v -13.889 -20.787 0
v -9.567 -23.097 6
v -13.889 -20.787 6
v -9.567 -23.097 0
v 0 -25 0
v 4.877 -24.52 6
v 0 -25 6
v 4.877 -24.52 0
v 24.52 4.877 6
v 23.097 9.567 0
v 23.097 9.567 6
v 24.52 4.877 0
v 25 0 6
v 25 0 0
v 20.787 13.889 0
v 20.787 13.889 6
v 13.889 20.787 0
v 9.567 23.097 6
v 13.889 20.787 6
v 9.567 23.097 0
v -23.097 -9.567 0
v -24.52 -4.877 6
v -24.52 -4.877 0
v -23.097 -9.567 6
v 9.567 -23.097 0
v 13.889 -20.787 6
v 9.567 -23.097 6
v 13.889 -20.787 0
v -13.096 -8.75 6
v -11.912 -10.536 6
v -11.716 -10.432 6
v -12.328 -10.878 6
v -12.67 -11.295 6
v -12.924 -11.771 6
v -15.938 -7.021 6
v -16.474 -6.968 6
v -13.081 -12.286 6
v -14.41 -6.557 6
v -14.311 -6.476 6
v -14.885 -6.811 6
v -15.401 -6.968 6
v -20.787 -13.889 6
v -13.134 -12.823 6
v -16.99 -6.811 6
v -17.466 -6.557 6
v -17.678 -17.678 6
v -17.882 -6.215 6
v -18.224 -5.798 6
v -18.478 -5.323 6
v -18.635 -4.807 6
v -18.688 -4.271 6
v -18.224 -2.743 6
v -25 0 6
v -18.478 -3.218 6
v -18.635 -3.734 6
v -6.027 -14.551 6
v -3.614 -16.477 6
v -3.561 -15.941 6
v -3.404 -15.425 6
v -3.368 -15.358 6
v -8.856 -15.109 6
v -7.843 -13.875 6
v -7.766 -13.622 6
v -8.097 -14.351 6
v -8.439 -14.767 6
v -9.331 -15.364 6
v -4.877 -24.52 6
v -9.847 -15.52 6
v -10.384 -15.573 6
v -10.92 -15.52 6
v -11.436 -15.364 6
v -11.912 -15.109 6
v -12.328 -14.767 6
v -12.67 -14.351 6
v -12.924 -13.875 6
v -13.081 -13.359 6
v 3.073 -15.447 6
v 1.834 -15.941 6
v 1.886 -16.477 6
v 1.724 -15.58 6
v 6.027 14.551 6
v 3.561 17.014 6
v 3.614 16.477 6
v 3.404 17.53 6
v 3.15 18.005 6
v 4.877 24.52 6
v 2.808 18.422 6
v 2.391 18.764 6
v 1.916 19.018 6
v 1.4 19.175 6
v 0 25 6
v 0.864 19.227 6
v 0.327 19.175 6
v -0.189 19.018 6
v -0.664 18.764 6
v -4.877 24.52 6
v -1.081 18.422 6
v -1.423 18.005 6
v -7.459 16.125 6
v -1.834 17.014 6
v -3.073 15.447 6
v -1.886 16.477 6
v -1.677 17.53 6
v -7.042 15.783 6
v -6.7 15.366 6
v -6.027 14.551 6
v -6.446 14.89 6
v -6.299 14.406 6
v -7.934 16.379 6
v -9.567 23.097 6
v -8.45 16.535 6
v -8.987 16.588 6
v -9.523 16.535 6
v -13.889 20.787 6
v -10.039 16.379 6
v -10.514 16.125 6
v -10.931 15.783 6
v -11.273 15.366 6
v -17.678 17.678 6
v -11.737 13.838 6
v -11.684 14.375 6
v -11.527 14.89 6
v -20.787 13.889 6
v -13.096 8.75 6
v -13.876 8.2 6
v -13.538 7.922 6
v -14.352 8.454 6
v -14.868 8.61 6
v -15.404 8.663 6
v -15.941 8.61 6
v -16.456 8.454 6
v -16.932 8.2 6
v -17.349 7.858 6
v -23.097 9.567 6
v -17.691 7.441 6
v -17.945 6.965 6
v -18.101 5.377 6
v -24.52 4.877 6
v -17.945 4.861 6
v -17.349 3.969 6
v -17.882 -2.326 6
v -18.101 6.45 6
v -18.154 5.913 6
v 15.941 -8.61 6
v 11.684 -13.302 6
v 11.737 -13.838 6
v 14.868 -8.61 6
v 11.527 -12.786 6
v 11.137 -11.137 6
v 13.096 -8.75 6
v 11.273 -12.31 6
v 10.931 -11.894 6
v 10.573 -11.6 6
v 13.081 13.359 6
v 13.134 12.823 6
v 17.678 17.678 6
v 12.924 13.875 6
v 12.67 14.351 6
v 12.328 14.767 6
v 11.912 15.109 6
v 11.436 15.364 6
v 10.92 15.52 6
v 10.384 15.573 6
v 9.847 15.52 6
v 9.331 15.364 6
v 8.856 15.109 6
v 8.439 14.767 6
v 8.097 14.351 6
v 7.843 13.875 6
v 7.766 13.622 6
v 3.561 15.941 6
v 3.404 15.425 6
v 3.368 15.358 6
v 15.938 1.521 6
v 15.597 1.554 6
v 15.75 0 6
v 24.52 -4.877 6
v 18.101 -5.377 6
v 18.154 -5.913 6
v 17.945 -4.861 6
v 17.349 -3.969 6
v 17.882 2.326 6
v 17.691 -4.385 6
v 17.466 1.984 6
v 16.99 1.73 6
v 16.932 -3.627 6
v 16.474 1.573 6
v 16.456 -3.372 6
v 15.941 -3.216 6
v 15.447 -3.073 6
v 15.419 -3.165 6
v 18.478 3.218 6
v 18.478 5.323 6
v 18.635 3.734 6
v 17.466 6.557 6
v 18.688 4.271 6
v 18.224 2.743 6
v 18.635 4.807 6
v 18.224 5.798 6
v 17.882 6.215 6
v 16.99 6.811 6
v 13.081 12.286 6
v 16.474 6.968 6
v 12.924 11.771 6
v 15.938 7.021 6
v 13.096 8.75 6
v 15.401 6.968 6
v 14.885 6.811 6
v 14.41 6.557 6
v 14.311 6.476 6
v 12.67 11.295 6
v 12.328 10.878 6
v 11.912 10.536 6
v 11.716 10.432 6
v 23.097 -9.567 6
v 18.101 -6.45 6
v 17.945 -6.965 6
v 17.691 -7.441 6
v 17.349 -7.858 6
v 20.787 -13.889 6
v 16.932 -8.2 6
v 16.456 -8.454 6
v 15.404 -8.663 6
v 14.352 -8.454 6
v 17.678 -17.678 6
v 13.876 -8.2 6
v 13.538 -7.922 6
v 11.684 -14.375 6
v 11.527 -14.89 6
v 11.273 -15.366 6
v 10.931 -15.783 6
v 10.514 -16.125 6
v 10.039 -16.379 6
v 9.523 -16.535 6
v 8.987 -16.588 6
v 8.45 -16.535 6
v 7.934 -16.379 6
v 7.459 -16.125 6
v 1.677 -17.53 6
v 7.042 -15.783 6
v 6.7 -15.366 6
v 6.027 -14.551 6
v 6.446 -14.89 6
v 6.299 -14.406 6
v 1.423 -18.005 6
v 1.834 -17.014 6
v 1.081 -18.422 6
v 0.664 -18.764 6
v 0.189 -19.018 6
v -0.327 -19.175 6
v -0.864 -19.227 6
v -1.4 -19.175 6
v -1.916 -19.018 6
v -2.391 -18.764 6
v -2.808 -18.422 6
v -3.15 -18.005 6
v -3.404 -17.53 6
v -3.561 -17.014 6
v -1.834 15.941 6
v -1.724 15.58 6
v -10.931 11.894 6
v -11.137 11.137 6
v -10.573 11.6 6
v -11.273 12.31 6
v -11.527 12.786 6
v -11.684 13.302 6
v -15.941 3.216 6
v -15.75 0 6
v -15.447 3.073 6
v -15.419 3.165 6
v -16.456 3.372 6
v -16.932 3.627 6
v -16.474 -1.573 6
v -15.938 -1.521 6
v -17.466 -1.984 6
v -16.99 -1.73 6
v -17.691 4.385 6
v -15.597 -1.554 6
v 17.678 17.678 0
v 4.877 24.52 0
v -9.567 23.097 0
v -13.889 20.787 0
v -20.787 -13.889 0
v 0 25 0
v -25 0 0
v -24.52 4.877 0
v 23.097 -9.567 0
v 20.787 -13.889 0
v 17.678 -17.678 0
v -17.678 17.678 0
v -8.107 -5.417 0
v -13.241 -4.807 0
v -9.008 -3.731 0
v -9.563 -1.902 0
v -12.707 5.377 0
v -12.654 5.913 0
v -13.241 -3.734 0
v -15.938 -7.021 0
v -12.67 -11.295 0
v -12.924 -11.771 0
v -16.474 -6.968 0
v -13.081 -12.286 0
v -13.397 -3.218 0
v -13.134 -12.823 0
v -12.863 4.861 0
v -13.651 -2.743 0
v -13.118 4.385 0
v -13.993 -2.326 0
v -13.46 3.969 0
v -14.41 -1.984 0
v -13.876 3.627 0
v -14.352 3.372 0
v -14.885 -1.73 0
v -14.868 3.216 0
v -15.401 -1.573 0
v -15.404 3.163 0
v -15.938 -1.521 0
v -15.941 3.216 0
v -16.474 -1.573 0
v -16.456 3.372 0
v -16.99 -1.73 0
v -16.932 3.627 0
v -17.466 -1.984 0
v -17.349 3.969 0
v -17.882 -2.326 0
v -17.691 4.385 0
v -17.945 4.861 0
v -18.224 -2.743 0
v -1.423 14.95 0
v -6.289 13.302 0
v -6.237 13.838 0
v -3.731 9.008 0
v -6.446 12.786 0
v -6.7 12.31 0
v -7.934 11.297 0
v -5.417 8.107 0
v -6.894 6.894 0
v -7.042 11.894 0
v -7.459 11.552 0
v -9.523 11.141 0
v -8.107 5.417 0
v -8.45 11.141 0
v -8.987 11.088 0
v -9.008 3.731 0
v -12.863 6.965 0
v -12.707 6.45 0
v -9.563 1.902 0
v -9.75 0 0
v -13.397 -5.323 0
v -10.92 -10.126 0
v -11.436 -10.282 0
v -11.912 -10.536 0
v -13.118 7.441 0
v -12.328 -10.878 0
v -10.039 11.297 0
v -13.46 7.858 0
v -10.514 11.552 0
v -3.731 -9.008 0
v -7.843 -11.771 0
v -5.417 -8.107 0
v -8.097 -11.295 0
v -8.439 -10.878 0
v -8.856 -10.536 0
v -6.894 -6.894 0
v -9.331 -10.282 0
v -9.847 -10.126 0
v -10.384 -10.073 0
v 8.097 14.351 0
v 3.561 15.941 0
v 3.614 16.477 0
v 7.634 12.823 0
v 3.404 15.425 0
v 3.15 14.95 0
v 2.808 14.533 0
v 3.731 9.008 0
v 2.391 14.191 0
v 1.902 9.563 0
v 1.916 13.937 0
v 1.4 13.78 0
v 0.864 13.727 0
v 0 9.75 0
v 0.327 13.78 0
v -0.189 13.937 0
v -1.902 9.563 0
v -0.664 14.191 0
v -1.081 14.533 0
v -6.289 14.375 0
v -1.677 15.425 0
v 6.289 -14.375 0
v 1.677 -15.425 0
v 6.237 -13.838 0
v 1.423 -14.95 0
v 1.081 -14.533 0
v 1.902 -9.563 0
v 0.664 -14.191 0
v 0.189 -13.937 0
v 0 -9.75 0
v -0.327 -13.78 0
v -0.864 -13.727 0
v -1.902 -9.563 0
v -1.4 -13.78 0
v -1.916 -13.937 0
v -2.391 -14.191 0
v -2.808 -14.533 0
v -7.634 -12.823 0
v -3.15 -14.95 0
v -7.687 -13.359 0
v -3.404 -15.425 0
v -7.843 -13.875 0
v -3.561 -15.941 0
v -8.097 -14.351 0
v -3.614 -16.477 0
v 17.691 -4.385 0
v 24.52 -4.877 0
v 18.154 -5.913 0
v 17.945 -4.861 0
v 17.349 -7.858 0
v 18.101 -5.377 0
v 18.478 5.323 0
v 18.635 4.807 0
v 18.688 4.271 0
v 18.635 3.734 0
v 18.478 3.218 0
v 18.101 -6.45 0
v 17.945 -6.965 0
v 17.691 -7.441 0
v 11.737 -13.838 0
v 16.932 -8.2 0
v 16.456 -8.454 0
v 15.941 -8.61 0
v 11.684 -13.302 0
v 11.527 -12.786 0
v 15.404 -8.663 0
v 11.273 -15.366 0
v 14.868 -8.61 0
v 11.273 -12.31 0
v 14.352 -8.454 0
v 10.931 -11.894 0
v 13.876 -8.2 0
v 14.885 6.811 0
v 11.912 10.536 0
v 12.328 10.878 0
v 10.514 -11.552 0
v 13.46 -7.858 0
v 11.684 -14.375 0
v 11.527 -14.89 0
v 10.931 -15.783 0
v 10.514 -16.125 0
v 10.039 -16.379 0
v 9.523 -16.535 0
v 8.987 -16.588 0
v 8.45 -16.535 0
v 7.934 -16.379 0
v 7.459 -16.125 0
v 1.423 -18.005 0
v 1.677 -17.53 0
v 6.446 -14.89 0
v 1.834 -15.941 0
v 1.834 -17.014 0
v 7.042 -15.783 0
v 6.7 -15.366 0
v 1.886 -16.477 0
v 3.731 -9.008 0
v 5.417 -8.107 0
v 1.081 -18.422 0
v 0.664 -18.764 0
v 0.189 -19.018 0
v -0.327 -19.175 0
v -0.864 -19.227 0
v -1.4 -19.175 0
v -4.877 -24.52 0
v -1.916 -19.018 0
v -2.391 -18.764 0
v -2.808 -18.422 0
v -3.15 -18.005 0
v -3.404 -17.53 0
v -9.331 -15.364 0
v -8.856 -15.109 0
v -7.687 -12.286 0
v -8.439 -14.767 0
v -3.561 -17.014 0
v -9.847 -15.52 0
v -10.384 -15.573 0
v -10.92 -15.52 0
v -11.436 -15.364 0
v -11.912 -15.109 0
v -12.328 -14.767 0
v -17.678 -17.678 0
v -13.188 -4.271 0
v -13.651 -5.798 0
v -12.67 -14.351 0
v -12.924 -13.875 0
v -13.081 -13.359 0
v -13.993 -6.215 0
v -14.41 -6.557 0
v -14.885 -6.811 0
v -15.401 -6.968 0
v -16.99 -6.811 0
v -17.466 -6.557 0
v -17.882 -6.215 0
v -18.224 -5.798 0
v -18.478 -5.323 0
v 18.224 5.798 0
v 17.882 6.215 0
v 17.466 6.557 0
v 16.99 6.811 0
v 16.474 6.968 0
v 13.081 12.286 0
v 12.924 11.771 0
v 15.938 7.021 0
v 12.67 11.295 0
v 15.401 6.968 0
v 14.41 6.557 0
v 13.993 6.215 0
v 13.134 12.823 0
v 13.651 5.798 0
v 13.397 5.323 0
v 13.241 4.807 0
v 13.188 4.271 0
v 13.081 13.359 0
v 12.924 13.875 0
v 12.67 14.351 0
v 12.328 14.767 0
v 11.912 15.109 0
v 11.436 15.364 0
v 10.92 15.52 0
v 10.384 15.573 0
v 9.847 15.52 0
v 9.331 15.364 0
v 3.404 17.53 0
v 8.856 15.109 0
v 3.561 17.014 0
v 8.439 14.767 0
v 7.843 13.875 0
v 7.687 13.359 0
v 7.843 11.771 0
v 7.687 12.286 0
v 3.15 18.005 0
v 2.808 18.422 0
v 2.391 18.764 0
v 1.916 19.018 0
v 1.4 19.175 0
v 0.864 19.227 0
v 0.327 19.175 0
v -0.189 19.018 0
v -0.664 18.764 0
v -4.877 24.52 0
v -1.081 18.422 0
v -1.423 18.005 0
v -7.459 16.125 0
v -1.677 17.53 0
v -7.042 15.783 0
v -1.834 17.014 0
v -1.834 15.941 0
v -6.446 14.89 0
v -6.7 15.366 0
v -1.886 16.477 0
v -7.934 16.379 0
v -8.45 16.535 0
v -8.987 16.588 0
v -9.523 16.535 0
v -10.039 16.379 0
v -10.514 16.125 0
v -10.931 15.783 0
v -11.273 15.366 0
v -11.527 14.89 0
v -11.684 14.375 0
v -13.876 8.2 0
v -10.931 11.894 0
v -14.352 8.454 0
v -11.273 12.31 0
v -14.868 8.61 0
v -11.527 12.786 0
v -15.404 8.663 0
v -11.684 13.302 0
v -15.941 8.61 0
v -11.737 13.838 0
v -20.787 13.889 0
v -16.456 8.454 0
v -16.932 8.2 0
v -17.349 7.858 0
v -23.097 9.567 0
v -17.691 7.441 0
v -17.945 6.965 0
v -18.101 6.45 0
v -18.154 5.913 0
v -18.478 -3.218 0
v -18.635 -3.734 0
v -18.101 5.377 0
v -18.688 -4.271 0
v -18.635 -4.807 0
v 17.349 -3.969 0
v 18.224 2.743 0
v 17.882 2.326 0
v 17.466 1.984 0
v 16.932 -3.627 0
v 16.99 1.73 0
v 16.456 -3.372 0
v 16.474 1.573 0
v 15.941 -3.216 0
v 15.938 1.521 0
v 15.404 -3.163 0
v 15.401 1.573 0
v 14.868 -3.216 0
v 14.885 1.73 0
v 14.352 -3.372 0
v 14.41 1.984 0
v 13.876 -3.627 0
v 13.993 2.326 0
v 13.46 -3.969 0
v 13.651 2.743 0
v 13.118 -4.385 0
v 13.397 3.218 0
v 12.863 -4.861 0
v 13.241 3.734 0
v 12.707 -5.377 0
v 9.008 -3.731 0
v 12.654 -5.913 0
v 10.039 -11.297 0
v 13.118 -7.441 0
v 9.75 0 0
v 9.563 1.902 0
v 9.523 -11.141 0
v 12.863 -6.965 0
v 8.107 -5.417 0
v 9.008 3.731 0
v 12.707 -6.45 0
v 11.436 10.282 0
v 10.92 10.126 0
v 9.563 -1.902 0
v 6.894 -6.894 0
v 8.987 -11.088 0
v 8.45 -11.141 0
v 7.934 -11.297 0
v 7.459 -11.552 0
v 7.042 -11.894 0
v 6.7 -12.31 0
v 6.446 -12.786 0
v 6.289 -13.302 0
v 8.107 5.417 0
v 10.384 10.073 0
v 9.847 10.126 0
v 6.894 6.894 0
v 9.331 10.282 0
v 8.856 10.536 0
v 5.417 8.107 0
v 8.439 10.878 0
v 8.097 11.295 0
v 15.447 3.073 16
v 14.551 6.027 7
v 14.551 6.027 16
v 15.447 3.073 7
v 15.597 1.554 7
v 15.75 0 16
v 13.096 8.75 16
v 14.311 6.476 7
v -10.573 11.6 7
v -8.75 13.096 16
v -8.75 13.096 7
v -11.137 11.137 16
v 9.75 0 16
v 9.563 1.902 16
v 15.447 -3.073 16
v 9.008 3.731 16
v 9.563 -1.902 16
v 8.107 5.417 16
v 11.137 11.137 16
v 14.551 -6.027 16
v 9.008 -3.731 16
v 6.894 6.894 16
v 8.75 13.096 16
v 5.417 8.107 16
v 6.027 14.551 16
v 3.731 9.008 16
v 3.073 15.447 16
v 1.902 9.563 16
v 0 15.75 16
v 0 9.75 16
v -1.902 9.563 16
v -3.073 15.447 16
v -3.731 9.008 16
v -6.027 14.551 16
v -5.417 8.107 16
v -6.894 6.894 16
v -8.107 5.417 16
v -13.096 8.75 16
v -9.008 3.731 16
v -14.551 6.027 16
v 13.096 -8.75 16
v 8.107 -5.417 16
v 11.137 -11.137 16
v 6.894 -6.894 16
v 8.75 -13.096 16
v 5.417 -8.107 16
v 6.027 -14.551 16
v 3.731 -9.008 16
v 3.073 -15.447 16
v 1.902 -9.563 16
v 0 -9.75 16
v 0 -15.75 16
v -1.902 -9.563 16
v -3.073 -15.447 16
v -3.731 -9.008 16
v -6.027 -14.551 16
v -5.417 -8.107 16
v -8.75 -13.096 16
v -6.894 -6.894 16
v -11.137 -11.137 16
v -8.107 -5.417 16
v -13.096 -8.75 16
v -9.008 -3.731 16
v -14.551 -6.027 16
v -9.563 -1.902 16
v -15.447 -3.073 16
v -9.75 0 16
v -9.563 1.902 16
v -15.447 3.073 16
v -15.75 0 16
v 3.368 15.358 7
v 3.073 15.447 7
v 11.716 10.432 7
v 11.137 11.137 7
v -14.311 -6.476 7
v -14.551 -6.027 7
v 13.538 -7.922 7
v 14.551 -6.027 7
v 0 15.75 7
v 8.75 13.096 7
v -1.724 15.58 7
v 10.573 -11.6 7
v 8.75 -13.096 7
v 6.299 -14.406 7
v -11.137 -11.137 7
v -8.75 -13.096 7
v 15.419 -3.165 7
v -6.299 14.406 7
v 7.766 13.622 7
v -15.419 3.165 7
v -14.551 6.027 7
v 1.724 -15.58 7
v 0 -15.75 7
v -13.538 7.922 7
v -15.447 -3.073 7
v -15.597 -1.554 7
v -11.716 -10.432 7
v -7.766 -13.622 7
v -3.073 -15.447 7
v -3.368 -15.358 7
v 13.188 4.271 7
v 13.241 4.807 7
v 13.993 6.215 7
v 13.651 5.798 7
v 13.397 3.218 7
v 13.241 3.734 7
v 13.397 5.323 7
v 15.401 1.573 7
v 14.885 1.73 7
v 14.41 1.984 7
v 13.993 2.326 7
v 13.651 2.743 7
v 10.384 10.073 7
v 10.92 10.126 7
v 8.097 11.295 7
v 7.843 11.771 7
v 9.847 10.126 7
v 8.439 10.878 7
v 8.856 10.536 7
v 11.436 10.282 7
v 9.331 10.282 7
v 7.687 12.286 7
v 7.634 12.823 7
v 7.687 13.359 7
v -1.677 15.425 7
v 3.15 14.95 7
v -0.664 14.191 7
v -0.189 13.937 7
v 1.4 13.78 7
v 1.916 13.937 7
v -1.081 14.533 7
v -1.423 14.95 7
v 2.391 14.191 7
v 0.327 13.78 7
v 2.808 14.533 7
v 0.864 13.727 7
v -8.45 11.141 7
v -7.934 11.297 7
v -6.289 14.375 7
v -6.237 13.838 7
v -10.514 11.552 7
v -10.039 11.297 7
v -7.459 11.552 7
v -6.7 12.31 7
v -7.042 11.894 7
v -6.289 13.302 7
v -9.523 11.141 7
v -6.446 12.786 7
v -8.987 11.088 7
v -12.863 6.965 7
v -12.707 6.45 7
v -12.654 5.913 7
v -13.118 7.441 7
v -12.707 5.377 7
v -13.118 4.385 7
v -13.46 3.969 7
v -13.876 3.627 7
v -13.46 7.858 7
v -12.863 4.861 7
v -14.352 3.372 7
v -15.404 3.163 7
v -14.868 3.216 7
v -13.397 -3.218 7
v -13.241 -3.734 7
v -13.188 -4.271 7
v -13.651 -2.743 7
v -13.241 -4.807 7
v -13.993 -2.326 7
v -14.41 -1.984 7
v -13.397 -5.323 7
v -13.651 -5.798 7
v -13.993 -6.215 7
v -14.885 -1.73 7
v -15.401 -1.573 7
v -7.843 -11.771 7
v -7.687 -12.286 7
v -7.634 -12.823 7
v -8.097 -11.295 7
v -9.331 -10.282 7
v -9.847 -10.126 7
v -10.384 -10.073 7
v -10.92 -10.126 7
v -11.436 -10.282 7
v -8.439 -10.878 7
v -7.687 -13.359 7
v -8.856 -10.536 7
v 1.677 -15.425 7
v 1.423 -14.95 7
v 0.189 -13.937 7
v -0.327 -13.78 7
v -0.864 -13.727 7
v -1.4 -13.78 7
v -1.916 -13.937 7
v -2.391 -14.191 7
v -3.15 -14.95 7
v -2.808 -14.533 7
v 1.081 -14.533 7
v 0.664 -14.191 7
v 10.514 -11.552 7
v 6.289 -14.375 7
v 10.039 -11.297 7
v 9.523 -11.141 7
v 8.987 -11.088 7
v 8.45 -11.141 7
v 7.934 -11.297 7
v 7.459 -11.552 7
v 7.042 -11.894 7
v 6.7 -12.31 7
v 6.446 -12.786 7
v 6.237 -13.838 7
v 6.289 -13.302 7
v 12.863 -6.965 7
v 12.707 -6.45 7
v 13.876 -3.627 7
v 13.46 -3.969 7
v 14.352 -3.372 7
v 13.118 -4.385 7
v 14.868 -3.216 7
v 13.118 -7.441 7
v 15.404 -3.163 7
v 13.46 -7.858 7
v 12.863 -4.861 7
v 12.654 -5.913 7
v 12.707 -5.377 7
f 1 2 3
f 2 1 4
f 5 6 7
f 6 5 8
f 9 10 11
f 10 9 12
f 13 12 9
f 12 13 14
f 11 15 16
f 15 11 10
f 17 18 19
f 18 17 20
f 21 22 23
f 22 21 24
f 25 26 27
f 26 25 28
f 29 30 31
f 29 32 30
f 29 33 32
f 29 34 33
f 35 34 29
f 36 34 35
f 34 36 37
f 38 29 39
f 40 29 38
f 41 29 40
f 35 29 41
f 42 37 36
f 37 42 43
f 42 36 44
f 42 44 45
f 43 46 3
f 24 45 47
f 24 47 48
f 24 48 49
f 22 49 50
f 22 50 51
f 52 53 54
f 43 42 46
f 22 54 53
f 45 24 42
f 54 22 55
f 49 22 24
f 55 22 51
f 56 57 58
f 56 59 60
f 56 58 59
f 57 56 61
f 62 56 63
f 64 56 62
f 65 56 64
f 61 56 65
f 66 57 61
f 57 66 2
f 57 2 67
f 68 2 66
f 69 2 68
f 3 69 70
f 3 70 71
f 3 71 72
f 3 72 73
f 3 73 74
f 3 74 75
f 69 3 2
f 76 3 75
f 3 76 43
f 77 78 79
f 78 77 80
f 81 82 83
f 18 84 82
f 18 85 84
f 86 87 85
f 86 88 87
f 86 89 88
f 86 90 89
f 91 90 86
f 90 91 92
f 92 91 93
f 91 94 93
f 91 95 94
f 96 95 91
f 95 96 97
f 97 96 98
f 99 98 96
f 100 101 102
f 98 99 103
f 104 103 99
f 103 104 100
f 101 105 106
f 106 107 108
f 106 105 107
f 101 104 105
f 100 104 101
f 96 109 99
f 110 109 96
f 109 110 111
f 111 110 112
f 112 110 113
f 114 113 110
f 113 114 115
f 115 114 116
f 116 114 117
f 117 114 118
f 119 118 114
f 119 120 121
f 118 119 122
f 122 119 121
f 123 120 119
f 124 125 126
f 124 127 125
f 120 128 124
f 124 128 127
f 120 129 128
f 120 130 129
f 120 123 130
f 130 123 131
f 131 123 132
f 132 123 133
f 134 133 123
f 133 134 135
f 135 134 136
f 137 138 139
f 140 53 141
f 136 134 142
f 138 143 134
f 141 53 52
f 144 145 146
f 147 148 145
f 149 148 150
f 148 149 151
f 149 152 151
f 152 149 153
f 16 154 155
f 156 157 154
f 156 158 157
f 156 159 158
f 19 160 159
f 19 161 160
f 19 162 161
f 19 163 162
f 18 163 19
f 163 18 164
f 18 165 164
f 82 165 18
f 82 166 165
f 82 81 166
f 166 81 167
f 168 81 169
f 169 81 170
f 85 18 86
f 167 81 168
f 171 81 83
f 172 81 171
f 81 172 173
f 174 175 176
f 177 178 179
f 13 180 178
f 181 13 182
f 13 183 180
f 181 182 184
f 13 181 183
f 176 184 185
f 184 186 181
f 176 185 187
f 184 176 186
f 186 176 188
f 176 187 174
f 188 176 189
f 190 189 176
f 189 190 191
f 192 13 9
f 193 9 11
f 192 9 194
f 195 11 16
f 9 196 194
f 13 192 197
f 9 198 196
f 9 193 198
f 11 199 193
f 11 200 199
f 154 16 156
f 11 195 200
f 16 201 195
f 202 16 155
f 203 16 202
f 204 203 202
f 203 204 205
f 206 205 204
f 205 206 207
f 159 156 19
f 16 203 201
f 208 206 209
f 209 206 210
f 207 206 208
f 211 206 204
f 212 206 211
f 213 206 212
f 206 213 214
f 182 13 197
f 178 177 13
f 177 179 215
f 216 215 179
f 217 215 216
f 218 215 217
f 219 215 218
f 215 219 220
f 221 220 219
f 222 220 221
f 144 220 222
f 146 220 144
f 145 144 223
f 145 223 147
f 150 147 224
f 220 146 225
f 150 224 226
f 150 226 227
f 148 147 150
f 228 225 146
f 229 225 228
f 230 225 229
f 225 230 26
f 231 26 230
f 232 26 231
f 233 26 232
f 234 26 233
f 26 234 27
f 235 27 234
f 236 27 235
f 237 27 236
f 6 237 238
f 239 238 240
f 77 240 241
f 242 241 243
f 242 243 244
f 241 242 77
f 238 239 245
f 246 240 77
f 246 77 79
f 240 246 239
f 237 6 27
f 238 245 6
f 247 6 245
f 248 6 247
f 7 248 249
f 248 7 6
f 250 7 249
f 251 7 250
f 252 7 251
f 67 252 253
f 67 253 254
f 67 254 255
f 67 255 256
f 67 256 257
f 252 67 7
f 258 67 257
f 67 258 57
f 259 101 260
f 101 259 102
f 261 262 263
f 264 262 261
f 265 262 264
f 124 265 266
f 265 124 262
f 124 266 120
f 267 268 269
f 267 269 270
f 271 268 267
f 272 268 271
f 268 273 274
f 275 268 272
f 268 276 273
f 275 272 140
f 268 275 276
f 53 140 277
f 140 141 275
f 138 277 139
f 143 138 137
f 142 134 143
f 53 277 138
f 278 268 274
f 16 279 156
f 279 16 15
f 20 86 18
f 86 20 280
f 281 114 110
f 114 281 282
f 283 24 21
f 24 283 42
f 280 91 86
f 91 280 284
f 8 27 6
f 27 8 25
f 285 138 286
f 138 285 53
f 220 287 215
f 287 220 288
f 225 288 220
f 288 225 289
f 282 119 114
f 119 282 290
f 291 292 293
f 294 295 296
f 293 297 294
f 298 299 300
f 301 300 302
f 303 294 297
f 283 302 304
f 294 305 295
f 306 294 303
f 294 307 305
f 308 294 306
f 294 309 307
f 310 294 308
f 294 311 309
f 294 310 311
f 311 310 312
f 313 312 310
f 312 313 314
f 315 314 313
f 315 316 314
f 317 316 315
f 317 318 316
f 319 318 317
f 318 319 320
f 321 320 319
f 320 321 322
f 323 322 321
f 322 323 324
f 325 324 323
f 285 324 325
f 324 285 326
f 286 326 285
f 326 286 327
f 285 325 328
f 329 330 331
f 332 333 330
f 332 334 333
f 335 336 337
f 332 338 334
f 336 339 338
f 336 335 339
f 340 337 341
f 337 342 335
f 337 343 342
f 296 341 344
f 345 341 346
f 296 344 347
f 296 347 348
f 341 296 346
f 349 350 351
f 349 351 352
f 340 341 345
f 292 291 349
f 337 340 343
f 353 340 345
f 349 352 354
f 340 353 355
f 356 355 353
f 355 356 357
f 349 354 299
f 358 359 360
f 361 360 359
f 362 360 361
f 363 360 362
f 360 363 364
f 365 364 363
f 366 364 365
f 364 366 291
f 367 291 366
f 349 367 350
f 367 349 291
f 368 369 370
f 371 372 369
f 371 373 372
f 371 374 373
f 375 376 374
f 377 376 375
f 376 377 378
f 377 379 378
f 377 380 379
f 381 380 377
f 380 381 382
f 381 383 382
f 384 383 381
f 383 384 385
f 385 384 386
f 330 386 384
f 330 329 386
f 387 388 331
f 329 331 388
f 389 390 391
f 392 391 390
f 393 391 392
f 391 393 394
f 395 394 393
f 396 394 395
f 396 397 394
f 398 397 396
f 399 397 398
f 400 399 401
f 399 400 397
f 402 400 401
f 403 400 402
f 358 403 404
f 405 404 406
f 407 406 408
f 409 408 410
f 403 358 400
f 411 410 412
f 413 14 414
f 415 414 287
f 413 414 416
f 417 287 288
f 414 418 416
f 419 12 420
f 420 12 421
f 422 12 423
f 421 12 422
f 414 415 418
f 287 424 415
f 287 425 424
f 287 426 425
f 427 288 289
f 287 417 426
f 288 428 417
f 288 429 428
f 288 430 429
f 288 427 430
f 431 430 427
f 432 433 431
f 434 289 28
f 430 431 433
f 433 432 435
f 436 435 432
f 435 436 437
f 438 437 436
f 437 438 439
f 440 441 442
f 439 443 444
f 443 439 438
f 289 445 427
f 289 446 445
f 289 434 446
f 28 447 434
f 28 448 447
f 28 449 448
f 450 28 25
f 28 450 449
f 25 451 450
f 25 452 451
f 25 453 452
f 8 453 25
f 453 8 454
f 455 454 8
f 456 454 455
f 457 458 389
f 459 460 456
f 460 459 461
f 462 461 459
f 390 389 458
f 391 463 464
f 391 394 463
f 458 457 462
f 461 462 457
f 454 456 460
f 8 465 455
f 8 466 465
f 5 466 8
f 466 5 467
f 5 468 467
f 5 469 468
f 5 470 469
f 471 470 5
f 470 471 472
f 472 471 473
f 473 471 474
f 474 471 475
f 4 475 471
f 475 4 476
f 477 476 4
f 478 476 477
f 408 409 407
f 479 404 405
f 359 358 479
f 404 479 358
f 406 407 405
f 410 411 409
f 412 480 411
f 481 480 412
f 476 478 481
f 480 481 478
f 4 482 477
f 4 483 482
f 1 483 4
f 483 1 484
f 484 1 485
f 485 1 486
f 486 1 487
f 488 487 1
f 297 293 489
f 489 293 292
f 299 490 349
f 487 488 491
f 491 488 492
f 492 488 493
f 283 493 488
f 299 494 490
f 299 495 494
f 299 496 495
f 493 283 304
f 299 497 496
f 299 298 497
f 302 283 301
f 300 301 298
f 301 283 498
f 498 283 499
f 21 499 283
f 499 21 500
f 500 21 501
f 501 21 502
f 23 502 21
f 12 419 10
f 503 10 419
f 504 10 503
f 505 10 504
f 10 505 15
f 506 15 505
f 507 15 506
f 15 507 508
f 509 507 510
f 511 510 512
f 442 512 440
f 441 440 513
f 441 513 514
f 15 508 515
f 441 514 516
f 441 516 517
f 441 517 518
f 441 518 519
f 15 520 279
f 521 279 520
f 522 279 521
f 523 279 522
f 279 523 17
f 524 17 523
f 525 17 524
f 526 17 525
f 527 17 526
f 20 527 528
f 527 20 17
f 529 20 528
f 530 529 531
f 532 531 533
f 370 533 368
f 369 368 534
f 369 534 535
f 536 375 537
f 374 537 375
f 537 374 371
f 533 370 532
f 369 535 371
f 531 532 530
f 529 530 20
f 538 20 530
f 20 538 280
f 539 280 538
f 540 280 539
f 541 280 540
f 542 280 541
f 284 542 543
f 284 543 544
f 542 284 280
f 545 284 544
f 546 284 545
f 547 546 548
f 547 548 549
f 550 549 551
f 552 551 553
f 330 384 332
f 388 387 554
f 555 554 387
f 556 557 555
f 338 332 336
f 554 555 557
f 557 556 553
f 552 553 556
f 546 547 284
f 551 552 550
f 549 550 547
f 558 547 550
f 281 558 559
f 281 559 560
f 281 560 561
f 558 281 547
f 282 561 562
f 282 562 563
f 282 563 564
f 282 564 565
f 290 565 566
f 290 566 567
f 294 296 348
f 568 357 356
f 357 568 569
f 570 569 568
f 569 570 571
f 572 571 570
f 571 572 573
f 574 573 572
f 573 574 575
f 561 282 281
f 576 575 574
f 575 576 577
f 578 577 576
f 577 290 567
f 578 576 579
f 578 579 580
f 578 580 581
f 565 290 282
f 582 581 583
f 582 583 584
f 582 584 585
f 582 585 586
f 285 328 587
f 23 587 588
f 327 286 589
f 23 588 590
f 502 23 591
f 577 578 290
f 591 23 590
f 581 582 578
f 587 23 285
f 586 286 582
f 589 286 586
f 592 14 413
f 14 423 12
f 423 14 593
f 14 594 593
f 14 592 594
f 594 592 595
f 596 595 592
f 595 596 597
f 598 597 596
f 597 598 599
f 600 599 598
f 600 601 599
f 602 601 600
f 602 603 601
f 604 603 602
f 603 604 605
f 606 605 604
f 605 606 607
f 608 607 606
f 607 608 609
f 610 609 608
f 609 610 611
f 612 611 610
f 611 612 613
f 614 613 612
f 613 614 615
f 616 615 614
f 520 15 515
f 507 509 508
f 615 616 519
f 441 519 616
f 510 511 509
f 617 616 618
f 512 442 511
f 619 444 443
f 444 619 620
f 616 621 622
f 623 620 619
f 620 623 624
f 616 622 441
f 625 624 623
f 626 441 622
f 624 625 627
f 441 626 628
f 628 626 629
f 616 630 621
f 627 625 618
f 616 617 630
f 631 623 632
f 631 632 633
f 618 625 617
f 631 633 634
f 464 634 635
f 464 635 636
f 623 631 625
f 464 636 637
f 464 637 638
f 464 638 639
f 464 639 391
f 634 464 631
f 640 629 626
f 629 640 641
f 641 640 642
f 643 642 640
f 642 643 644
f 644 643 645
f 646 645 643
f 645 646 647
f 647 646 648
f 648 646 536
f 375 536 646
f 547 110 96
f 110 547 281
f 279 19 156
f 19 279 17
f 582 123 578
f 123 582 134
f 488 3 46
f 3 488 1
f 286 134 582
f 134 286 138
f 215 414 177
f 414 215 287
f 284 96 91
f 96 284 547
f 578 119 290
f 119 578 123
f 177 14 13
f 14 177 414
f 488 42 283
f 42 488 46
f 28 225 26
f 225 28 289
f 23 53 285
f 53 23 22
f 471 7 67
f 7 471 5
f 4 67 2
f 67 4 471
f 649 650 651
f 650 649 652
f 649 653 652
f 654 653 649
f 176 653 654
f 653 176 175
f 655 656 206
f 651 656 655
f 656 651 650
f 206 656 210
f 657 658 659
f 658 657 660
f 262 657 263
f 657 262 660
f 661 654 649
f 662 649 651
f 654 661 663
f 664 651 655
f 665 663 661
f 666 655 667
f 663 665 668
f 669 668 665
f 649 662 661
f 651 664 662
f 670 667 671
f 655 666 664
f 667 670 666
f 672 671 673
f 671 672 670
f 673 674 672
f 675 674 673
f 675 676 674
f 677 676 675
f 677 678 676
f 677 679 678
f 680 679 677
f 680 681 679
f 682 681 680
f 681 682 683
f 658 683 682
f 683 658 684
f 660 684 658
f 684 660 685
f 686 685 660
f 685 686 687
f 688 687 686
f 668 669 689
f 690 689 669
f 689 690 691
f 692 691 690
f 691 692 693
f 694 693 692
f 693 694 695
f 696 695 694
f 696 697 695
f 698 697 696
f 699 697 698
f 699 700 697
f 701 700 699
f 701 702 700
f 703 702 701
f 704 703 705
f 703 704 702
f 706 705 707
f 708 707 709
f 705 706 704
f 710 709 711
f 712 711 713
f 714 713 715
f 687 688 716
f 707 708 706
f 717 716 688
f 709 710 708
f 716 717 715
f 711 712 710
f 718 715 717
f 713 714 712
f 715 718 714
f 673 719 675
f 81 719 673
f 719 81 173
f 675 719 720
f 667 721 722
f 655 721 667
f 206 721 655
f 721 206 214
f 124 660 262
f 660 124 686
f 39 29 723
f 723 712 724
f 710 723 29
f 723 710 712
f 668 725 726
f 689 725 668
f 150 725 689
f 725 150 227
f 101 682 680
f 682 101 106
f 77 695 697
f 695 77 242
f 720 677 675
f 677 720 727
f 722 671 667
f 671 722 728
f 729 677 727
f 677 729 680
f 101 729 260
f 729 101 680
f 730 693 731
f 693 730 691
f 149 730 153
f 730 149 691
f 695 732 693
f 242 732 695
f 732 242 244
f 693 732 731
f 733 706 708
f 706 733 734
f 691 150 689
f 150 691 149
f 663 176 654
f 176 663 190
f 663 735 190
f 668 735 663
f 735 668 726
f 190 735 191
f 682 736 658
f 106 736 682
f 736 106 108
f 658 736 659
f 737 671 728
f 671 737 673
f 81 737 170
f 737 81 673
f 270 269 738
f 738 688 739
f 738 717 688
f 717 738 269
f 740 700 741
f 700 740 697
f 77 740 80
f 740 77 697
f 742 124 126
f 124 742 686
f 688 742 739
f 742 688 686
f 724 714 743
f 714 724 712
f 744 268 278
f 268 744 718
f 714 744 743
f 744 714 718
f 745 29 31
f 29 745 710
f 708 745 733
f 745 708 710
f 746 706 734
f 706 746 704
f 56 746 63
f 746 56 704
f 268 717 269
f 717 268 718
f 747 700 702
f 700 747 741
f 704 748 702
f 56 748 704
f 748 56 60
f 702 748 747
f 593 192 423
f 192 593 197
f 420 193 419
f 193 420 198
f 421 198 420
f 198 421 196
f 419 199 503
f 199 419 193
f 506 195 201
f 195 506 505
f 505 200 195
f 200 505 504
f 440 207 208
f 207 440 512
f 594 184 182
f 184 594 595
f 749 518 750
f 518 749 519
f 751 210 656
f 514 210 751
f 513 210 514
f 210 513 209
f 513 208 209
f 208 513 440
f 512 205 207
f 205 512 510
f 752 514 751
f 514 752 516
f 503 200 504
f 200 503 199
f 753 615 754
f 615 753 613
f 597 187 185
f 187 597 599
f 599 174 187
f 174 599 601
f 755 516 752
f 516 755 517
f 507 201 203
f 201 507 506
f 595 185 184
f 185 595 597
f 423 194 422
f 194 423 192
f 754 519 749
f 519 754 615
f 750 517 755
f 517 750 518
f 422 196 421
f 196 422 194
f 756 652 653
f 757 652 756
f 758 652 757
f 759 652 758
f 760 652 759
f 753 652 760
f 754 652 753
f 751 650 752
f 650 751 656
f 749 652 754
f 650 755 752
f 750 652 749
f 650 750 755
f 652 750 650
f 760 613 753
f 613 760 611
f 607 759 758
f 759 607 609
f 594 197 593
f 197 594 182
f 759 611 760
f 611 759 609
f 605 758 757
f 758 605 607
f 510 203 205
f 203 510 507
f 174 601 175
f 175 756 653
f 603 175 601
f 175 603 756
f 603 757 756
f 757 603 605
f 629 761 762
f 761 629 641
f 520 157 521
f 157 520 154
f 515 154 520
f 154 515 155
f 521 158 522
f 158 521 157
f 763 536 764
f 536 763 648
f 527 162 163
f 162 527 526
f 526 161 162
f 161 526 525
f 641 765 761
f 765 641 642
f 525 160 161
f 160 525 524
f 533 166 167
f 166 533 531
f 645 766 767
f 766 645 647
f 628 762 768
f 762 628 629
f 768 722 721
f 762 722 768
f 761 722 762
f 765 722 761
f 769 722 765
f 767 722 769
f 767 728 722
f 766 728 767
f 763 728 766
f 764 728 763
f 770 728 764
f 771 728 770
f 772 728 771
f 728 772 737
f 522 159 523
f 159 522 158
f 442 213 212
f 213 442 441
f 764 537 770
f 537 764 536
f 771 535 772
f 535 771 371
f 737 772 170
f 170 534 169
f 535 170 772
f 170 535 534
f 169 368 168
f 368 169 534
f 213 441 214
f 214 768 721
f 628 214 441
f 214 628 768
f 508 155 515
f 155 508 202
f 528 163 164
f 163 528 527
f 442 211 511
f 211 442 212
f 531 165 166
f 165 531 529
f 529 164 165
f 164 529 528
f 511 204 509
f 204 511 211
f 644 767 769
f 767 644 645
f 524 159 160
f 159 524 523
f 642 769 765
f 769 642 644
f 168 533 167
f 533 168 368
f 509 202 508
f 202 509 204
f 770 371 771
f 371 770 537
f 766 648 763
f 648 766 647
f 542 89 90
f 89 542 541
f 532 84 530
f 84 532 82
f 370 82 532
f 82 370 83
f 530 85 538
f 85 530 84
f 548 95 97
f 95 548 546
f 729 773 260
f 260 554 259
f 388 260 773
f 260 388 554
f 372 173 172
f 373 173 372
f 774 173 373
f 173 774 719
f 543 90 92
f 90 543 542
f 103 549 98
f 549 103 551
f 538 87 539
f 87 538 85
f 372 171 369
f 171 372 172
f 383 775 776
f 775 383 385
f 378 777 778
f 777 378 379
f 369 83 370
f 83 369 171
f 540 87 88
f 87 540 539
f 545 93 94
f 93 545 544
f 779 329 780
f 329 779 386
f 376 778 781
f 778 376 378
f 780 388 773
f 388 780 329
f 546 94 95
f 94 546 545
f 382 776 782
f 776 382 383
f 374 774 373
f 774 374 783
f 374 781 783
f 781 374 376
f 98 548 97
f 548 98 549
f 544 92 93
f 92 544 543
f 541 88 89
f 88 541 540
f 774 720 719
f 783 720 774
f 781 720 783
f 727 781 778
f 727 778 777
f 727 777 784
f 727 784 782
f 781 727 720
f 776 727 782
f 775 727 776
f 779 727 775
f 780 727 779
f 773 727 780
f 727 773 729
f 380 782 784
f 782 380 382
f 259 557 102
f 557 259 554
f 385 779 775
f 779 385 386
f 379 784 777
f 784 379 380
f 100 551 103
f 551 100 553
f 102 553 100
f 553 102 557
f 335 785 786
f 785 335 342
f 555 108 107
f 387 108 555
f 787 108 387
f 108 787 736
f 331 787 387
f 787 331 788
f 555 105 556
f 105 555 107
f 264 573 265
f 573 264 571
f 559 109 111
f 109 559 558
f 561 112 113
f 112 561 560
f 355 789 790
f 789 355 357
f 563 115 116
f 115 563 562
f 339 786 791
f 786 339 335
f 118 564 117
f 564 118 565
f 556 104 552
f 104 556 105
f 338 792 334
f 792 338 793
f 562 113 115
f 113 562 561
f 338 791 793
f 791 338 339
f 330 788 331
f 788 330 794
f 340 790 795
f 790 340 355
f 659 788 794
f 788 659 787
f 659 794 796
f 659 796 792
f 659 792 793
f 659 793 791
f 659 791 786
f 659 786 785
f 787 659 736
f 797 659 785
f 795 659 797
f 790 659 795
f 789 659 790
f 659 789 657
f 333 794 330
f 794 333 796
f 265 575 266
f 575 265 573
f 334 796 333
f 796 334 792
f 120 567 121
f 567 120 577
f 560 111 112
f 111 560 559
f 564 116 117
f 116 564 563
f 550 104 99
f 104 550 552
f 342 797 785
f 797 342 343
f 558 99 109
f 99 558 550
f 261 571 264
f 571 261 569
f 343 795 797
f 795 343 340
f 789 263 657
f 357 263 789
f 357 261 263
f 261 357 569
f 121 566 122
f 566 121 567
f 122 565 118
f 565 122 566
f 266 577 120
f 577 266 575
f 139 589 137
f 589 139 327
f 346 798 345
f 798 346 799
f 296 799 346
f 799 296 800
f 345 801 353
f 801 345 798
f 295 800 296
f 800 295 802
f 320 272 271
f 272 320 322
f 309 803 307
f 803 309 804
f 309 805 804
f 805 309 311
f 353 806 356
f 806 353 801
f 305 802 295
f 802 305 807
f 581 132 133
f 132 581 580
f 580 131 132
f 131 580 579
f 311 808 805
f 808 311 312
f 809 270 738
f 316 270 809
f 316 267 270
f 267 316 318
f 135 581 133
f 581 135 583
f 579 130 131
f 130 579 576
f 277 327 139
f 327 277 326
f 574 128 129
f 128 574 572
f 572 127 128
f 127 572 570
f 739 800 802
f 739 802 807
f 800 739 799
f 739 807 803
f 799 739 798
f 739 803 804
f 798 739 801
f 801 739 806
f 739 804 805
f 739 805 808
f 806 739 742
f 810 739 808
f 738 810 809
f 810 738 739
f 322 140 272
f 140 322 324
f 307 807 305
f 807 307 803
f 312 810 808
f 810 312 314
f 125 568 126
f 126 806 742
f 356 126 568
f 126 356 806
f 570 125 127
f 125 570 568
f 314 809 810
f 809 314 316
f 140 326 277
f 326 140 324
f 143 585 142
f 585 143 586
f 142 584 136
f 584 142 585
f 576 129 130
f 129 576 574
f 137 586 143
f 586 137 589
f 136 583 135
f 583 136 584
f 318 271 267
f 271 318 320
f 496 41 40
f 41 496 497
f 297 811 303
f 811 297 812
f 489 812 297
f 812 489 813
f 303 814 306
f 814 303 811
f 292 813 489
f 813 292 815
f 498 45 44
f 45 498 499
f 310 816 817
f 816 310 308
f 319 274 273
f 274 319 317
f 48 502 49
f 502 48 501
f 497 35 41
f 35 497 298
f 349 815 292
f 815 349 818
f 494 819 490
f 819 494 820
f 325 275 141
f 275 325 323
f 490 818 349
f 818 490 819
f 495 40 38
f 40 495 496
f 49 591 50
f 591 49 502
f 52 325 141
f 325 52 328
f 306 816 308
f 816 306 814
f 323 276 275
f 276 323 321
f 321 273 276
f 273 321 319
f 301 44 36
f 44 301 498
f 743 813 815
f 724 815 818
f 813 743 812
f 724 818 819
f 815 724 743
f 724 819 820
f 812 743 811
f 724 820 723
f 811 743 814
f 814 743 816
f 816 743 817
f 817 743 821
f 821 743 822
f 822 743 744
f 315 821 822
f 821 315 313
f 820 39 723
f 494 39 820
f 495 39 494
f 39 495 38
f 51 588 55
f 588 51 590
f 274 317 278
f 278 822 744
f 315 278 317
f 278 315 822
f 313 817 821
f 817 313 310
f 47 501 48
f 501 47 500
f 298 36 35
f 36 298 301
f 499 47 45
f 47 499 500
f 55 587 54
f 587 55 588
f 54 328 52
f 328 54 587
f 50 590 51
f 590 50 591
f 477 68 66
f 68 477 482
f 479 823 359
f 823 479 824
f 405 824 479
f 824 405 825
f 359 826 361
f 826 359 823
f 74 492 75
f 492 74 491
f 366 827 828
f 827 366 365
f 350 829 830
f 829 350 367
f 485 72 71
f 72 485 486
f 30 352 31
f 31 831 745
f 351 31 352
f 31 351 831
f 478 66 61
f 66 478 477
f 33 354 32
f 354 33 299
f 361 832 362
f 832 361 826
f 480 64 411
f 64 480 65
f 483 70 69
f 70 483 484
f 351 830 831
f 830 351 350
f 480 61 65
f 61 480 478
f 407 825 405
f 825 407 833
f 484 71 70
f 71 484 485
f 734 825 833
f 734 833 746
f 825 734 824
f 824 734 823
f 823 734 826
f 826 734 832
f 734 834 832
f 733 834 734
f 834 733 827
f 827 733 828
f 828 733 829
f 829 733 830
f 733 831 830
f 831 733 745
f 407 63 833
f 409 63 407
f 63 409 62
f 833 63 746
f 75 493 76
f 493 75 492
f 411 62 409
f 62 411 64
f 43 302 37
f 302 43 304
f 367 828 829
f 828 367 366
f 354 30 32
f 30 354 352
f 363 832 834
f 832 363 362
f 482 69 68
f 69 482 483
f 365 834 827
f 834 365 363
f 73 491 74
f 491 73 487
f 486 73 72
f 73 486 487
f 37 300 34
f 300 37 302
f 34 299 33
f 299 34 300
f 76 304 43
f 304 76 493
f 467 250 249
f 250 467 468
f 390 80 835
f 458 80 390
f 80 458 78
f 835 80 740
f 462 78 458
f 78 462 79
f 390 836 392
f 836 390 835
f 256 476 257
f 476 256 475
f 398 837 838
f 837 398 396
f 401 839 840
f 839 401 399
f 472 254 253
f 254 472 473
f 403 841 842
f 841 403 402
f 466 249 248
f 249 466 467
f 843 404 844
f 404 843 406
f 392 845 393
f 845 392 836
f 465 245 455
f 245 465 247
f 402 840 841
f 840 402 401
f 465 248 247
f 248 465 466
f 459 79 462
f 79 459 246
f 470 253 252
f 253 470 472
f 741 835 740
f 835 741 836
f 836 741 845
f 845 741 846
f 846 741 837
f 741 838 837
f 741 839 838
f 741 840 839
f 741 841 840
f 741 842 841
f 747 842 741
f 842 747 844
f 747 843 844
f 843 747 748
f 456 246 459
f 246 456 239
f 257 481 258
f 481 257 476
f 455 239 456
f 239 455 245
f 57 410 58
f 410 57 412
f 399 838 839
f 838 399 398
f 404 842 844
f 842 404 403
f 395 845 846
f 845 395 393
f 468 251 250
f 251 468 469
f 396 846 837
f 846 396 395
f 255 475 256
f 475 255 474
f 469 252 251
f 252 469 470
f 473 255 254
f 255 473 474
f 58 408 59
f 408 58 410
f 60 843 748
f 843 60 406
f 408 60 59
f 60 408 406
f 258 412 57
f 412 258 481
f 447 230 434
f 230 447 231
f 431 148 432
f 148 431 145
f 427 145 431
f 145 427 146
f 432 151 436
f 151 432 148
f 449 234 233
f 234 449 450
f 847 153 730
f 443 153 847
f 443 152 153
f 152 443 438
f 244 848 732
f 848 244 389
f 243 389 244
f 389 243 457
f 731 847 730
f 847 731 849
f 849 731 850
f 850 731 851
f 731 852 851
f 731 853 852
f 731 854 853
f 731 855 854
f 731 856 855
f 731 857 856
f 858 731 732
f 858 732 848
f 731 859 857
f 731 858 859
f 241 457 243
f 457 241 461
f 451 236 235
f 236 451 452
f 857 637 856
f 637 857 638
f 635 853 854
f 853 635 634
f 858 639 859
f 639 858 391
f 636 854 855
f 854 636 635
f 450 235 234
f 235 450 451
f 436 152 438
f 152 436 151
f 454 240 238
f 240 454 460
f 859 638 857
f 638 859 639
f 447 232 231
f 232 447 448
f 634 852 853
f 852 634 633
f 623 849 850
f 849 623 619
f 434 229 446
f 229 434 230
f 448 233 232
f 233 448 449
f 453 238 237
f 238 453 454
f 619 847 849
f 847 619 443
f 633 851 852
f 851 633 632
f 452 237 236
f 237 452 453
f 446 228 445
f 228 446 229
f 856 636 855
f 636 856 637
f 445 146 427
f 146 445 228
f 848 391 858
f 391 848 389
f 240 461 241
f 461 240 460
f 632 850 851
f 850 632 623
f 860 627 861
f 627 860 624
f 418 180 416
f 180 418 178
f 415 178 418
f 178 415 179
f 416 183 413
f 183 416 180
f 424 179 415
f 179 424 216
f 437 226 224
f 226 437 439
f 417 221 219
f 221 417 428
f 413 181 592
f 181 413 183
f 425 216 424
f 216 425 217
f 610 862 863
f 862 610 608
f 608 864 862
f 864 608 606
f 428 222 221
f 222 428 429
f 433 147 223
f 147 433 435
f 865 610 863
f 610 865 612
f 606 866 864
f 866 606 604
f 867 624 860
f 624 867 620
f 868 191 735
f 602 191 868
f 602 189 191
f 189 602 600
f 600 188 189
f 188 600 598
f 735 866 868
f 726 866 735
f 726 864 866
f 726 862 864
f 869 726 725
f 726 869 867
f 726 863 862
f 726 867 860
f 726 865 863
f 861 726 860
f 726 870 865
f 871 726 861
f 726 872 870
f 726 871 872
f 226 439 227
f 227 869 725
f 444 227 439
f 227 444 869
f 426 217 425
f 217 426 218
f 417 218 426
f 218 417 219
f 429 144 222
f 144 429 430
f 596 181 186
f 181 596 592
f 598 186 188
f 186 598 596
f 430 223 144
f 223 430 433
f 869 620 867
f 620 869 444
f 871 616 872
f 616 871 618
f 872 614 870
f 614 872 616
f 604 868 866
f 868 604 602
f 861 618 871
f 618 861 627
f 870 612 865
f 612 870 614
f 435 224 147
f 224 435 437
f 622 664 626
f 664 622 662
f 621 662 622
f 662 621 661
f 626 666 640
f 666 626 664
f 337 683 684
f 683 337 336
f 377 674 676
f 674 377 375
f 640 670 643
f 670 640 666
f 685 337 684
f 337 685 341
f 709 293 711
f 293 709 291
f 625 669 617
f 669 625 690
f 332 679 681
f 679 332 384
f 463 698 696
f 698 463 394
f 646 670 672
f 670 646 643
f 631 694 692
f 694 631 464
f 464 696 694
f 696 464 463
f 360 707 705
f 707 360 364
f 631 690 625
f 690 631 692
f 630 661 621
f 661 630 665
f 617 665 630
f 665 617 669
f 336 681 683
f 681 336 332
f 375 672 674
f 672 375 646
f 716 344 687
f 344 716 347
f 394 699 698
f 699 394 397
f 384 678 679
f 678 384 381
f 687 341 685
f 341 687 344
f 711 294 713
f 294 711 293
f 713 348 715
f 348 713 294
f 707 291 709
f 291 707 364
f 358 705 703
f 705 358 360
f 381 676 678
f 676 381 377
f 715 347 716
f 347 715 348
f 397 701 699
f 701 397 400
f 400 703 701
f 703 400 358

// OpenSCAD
$fn = 32;

// ----------------------------------------------------------------------
// Flange Ø50 x 6
// 10 holes on a Ø33 bolt circle, bolted joints
// ----------------------------------------------------------------------

// --- parameters (mm) ---
flange_d = 50;   // outside diameter of the flange
thickness = 6;   // flange thickness
holes = 10;      // number of bolt holes
pcd = 33;        // bolt circle diameter
start_deg = 15;  // angle of the first hole, from +X
hole_d = 5.5;    // bolt hole diameter
bore_d = 19.5;   // central through bore
hub_d = 31.5;    // hub outside diameter
hub_h = 10;      // hub height above the flange face (0 = no hub)

// --- derived feature positions (mm) ---
height = thickness + hub_h;  // = 16   overall height of the part
pcd_r = pcd / 2;             // = 16.5   bolt circle radius
hole_step = 360 / holes;     // = 36   angular pitch
feature_centers = [
  [pcd_r * cos(start_deg + 0 * hole_step), pcd_r * sin(start_deg + 0 * hole_step)],
  [pcd_r * cos(start_deg + 1 * hole_step), pcd_r * sin(start_deg + 1 * hole_step)],
  [pcd_r * cos(start_deg + 2 * hole_step), pcd_r * sin(start_deg + 2 * hole_step)],
  [pcd_r * cos(start_deg + 3 * hole_step), pcd_r * sin(start_deg + 3 * hole_step)],
  [pcd_r * cos(start_deg + 4 * hole_step), pcd_r * sin(start_deg + 4 * hole_step)],
  [pcd_r * cos(start_deg + 5 * hole_step), pcd_r * sin(start_deg + 5 * hole_step)],
  [pcd_r * cos(start_deg + 6 * hole_step), pcd_r * sin(start_deg + 6 * hole_step)],
  [pcd_r * cos(start_deg + 7 * hole_step), pcd_r * sin(start_deg + 7 * hole_step)],
  [pcd_r * cos(start_deg + 8 * hole_step), pcd_r * sin(start_deg + 8 * hole_step)],
  [pcd_r * cos(start_deg + 9 * hole_step), pcd_r * sin(start_deg + 9 * hole_step)]
];   // bolt hole centres on the pitch circle

// flange disc, every hole and the bore cut straight through
difference() {
  union() {
    cylinder(d = flange_d, h = thickness);
    cylinder(d = hub_d, h = height);  // hub, overlapped into the flange
  }
  translate([0, 0, -1]) cylinder(d = bore_d, h = height + 2);  // bore, through
  for (centre = feature_centers)
    translate([centre[0], centre[1], -1]) cylinder(d = hole_d, h = thickness + 2);
}
